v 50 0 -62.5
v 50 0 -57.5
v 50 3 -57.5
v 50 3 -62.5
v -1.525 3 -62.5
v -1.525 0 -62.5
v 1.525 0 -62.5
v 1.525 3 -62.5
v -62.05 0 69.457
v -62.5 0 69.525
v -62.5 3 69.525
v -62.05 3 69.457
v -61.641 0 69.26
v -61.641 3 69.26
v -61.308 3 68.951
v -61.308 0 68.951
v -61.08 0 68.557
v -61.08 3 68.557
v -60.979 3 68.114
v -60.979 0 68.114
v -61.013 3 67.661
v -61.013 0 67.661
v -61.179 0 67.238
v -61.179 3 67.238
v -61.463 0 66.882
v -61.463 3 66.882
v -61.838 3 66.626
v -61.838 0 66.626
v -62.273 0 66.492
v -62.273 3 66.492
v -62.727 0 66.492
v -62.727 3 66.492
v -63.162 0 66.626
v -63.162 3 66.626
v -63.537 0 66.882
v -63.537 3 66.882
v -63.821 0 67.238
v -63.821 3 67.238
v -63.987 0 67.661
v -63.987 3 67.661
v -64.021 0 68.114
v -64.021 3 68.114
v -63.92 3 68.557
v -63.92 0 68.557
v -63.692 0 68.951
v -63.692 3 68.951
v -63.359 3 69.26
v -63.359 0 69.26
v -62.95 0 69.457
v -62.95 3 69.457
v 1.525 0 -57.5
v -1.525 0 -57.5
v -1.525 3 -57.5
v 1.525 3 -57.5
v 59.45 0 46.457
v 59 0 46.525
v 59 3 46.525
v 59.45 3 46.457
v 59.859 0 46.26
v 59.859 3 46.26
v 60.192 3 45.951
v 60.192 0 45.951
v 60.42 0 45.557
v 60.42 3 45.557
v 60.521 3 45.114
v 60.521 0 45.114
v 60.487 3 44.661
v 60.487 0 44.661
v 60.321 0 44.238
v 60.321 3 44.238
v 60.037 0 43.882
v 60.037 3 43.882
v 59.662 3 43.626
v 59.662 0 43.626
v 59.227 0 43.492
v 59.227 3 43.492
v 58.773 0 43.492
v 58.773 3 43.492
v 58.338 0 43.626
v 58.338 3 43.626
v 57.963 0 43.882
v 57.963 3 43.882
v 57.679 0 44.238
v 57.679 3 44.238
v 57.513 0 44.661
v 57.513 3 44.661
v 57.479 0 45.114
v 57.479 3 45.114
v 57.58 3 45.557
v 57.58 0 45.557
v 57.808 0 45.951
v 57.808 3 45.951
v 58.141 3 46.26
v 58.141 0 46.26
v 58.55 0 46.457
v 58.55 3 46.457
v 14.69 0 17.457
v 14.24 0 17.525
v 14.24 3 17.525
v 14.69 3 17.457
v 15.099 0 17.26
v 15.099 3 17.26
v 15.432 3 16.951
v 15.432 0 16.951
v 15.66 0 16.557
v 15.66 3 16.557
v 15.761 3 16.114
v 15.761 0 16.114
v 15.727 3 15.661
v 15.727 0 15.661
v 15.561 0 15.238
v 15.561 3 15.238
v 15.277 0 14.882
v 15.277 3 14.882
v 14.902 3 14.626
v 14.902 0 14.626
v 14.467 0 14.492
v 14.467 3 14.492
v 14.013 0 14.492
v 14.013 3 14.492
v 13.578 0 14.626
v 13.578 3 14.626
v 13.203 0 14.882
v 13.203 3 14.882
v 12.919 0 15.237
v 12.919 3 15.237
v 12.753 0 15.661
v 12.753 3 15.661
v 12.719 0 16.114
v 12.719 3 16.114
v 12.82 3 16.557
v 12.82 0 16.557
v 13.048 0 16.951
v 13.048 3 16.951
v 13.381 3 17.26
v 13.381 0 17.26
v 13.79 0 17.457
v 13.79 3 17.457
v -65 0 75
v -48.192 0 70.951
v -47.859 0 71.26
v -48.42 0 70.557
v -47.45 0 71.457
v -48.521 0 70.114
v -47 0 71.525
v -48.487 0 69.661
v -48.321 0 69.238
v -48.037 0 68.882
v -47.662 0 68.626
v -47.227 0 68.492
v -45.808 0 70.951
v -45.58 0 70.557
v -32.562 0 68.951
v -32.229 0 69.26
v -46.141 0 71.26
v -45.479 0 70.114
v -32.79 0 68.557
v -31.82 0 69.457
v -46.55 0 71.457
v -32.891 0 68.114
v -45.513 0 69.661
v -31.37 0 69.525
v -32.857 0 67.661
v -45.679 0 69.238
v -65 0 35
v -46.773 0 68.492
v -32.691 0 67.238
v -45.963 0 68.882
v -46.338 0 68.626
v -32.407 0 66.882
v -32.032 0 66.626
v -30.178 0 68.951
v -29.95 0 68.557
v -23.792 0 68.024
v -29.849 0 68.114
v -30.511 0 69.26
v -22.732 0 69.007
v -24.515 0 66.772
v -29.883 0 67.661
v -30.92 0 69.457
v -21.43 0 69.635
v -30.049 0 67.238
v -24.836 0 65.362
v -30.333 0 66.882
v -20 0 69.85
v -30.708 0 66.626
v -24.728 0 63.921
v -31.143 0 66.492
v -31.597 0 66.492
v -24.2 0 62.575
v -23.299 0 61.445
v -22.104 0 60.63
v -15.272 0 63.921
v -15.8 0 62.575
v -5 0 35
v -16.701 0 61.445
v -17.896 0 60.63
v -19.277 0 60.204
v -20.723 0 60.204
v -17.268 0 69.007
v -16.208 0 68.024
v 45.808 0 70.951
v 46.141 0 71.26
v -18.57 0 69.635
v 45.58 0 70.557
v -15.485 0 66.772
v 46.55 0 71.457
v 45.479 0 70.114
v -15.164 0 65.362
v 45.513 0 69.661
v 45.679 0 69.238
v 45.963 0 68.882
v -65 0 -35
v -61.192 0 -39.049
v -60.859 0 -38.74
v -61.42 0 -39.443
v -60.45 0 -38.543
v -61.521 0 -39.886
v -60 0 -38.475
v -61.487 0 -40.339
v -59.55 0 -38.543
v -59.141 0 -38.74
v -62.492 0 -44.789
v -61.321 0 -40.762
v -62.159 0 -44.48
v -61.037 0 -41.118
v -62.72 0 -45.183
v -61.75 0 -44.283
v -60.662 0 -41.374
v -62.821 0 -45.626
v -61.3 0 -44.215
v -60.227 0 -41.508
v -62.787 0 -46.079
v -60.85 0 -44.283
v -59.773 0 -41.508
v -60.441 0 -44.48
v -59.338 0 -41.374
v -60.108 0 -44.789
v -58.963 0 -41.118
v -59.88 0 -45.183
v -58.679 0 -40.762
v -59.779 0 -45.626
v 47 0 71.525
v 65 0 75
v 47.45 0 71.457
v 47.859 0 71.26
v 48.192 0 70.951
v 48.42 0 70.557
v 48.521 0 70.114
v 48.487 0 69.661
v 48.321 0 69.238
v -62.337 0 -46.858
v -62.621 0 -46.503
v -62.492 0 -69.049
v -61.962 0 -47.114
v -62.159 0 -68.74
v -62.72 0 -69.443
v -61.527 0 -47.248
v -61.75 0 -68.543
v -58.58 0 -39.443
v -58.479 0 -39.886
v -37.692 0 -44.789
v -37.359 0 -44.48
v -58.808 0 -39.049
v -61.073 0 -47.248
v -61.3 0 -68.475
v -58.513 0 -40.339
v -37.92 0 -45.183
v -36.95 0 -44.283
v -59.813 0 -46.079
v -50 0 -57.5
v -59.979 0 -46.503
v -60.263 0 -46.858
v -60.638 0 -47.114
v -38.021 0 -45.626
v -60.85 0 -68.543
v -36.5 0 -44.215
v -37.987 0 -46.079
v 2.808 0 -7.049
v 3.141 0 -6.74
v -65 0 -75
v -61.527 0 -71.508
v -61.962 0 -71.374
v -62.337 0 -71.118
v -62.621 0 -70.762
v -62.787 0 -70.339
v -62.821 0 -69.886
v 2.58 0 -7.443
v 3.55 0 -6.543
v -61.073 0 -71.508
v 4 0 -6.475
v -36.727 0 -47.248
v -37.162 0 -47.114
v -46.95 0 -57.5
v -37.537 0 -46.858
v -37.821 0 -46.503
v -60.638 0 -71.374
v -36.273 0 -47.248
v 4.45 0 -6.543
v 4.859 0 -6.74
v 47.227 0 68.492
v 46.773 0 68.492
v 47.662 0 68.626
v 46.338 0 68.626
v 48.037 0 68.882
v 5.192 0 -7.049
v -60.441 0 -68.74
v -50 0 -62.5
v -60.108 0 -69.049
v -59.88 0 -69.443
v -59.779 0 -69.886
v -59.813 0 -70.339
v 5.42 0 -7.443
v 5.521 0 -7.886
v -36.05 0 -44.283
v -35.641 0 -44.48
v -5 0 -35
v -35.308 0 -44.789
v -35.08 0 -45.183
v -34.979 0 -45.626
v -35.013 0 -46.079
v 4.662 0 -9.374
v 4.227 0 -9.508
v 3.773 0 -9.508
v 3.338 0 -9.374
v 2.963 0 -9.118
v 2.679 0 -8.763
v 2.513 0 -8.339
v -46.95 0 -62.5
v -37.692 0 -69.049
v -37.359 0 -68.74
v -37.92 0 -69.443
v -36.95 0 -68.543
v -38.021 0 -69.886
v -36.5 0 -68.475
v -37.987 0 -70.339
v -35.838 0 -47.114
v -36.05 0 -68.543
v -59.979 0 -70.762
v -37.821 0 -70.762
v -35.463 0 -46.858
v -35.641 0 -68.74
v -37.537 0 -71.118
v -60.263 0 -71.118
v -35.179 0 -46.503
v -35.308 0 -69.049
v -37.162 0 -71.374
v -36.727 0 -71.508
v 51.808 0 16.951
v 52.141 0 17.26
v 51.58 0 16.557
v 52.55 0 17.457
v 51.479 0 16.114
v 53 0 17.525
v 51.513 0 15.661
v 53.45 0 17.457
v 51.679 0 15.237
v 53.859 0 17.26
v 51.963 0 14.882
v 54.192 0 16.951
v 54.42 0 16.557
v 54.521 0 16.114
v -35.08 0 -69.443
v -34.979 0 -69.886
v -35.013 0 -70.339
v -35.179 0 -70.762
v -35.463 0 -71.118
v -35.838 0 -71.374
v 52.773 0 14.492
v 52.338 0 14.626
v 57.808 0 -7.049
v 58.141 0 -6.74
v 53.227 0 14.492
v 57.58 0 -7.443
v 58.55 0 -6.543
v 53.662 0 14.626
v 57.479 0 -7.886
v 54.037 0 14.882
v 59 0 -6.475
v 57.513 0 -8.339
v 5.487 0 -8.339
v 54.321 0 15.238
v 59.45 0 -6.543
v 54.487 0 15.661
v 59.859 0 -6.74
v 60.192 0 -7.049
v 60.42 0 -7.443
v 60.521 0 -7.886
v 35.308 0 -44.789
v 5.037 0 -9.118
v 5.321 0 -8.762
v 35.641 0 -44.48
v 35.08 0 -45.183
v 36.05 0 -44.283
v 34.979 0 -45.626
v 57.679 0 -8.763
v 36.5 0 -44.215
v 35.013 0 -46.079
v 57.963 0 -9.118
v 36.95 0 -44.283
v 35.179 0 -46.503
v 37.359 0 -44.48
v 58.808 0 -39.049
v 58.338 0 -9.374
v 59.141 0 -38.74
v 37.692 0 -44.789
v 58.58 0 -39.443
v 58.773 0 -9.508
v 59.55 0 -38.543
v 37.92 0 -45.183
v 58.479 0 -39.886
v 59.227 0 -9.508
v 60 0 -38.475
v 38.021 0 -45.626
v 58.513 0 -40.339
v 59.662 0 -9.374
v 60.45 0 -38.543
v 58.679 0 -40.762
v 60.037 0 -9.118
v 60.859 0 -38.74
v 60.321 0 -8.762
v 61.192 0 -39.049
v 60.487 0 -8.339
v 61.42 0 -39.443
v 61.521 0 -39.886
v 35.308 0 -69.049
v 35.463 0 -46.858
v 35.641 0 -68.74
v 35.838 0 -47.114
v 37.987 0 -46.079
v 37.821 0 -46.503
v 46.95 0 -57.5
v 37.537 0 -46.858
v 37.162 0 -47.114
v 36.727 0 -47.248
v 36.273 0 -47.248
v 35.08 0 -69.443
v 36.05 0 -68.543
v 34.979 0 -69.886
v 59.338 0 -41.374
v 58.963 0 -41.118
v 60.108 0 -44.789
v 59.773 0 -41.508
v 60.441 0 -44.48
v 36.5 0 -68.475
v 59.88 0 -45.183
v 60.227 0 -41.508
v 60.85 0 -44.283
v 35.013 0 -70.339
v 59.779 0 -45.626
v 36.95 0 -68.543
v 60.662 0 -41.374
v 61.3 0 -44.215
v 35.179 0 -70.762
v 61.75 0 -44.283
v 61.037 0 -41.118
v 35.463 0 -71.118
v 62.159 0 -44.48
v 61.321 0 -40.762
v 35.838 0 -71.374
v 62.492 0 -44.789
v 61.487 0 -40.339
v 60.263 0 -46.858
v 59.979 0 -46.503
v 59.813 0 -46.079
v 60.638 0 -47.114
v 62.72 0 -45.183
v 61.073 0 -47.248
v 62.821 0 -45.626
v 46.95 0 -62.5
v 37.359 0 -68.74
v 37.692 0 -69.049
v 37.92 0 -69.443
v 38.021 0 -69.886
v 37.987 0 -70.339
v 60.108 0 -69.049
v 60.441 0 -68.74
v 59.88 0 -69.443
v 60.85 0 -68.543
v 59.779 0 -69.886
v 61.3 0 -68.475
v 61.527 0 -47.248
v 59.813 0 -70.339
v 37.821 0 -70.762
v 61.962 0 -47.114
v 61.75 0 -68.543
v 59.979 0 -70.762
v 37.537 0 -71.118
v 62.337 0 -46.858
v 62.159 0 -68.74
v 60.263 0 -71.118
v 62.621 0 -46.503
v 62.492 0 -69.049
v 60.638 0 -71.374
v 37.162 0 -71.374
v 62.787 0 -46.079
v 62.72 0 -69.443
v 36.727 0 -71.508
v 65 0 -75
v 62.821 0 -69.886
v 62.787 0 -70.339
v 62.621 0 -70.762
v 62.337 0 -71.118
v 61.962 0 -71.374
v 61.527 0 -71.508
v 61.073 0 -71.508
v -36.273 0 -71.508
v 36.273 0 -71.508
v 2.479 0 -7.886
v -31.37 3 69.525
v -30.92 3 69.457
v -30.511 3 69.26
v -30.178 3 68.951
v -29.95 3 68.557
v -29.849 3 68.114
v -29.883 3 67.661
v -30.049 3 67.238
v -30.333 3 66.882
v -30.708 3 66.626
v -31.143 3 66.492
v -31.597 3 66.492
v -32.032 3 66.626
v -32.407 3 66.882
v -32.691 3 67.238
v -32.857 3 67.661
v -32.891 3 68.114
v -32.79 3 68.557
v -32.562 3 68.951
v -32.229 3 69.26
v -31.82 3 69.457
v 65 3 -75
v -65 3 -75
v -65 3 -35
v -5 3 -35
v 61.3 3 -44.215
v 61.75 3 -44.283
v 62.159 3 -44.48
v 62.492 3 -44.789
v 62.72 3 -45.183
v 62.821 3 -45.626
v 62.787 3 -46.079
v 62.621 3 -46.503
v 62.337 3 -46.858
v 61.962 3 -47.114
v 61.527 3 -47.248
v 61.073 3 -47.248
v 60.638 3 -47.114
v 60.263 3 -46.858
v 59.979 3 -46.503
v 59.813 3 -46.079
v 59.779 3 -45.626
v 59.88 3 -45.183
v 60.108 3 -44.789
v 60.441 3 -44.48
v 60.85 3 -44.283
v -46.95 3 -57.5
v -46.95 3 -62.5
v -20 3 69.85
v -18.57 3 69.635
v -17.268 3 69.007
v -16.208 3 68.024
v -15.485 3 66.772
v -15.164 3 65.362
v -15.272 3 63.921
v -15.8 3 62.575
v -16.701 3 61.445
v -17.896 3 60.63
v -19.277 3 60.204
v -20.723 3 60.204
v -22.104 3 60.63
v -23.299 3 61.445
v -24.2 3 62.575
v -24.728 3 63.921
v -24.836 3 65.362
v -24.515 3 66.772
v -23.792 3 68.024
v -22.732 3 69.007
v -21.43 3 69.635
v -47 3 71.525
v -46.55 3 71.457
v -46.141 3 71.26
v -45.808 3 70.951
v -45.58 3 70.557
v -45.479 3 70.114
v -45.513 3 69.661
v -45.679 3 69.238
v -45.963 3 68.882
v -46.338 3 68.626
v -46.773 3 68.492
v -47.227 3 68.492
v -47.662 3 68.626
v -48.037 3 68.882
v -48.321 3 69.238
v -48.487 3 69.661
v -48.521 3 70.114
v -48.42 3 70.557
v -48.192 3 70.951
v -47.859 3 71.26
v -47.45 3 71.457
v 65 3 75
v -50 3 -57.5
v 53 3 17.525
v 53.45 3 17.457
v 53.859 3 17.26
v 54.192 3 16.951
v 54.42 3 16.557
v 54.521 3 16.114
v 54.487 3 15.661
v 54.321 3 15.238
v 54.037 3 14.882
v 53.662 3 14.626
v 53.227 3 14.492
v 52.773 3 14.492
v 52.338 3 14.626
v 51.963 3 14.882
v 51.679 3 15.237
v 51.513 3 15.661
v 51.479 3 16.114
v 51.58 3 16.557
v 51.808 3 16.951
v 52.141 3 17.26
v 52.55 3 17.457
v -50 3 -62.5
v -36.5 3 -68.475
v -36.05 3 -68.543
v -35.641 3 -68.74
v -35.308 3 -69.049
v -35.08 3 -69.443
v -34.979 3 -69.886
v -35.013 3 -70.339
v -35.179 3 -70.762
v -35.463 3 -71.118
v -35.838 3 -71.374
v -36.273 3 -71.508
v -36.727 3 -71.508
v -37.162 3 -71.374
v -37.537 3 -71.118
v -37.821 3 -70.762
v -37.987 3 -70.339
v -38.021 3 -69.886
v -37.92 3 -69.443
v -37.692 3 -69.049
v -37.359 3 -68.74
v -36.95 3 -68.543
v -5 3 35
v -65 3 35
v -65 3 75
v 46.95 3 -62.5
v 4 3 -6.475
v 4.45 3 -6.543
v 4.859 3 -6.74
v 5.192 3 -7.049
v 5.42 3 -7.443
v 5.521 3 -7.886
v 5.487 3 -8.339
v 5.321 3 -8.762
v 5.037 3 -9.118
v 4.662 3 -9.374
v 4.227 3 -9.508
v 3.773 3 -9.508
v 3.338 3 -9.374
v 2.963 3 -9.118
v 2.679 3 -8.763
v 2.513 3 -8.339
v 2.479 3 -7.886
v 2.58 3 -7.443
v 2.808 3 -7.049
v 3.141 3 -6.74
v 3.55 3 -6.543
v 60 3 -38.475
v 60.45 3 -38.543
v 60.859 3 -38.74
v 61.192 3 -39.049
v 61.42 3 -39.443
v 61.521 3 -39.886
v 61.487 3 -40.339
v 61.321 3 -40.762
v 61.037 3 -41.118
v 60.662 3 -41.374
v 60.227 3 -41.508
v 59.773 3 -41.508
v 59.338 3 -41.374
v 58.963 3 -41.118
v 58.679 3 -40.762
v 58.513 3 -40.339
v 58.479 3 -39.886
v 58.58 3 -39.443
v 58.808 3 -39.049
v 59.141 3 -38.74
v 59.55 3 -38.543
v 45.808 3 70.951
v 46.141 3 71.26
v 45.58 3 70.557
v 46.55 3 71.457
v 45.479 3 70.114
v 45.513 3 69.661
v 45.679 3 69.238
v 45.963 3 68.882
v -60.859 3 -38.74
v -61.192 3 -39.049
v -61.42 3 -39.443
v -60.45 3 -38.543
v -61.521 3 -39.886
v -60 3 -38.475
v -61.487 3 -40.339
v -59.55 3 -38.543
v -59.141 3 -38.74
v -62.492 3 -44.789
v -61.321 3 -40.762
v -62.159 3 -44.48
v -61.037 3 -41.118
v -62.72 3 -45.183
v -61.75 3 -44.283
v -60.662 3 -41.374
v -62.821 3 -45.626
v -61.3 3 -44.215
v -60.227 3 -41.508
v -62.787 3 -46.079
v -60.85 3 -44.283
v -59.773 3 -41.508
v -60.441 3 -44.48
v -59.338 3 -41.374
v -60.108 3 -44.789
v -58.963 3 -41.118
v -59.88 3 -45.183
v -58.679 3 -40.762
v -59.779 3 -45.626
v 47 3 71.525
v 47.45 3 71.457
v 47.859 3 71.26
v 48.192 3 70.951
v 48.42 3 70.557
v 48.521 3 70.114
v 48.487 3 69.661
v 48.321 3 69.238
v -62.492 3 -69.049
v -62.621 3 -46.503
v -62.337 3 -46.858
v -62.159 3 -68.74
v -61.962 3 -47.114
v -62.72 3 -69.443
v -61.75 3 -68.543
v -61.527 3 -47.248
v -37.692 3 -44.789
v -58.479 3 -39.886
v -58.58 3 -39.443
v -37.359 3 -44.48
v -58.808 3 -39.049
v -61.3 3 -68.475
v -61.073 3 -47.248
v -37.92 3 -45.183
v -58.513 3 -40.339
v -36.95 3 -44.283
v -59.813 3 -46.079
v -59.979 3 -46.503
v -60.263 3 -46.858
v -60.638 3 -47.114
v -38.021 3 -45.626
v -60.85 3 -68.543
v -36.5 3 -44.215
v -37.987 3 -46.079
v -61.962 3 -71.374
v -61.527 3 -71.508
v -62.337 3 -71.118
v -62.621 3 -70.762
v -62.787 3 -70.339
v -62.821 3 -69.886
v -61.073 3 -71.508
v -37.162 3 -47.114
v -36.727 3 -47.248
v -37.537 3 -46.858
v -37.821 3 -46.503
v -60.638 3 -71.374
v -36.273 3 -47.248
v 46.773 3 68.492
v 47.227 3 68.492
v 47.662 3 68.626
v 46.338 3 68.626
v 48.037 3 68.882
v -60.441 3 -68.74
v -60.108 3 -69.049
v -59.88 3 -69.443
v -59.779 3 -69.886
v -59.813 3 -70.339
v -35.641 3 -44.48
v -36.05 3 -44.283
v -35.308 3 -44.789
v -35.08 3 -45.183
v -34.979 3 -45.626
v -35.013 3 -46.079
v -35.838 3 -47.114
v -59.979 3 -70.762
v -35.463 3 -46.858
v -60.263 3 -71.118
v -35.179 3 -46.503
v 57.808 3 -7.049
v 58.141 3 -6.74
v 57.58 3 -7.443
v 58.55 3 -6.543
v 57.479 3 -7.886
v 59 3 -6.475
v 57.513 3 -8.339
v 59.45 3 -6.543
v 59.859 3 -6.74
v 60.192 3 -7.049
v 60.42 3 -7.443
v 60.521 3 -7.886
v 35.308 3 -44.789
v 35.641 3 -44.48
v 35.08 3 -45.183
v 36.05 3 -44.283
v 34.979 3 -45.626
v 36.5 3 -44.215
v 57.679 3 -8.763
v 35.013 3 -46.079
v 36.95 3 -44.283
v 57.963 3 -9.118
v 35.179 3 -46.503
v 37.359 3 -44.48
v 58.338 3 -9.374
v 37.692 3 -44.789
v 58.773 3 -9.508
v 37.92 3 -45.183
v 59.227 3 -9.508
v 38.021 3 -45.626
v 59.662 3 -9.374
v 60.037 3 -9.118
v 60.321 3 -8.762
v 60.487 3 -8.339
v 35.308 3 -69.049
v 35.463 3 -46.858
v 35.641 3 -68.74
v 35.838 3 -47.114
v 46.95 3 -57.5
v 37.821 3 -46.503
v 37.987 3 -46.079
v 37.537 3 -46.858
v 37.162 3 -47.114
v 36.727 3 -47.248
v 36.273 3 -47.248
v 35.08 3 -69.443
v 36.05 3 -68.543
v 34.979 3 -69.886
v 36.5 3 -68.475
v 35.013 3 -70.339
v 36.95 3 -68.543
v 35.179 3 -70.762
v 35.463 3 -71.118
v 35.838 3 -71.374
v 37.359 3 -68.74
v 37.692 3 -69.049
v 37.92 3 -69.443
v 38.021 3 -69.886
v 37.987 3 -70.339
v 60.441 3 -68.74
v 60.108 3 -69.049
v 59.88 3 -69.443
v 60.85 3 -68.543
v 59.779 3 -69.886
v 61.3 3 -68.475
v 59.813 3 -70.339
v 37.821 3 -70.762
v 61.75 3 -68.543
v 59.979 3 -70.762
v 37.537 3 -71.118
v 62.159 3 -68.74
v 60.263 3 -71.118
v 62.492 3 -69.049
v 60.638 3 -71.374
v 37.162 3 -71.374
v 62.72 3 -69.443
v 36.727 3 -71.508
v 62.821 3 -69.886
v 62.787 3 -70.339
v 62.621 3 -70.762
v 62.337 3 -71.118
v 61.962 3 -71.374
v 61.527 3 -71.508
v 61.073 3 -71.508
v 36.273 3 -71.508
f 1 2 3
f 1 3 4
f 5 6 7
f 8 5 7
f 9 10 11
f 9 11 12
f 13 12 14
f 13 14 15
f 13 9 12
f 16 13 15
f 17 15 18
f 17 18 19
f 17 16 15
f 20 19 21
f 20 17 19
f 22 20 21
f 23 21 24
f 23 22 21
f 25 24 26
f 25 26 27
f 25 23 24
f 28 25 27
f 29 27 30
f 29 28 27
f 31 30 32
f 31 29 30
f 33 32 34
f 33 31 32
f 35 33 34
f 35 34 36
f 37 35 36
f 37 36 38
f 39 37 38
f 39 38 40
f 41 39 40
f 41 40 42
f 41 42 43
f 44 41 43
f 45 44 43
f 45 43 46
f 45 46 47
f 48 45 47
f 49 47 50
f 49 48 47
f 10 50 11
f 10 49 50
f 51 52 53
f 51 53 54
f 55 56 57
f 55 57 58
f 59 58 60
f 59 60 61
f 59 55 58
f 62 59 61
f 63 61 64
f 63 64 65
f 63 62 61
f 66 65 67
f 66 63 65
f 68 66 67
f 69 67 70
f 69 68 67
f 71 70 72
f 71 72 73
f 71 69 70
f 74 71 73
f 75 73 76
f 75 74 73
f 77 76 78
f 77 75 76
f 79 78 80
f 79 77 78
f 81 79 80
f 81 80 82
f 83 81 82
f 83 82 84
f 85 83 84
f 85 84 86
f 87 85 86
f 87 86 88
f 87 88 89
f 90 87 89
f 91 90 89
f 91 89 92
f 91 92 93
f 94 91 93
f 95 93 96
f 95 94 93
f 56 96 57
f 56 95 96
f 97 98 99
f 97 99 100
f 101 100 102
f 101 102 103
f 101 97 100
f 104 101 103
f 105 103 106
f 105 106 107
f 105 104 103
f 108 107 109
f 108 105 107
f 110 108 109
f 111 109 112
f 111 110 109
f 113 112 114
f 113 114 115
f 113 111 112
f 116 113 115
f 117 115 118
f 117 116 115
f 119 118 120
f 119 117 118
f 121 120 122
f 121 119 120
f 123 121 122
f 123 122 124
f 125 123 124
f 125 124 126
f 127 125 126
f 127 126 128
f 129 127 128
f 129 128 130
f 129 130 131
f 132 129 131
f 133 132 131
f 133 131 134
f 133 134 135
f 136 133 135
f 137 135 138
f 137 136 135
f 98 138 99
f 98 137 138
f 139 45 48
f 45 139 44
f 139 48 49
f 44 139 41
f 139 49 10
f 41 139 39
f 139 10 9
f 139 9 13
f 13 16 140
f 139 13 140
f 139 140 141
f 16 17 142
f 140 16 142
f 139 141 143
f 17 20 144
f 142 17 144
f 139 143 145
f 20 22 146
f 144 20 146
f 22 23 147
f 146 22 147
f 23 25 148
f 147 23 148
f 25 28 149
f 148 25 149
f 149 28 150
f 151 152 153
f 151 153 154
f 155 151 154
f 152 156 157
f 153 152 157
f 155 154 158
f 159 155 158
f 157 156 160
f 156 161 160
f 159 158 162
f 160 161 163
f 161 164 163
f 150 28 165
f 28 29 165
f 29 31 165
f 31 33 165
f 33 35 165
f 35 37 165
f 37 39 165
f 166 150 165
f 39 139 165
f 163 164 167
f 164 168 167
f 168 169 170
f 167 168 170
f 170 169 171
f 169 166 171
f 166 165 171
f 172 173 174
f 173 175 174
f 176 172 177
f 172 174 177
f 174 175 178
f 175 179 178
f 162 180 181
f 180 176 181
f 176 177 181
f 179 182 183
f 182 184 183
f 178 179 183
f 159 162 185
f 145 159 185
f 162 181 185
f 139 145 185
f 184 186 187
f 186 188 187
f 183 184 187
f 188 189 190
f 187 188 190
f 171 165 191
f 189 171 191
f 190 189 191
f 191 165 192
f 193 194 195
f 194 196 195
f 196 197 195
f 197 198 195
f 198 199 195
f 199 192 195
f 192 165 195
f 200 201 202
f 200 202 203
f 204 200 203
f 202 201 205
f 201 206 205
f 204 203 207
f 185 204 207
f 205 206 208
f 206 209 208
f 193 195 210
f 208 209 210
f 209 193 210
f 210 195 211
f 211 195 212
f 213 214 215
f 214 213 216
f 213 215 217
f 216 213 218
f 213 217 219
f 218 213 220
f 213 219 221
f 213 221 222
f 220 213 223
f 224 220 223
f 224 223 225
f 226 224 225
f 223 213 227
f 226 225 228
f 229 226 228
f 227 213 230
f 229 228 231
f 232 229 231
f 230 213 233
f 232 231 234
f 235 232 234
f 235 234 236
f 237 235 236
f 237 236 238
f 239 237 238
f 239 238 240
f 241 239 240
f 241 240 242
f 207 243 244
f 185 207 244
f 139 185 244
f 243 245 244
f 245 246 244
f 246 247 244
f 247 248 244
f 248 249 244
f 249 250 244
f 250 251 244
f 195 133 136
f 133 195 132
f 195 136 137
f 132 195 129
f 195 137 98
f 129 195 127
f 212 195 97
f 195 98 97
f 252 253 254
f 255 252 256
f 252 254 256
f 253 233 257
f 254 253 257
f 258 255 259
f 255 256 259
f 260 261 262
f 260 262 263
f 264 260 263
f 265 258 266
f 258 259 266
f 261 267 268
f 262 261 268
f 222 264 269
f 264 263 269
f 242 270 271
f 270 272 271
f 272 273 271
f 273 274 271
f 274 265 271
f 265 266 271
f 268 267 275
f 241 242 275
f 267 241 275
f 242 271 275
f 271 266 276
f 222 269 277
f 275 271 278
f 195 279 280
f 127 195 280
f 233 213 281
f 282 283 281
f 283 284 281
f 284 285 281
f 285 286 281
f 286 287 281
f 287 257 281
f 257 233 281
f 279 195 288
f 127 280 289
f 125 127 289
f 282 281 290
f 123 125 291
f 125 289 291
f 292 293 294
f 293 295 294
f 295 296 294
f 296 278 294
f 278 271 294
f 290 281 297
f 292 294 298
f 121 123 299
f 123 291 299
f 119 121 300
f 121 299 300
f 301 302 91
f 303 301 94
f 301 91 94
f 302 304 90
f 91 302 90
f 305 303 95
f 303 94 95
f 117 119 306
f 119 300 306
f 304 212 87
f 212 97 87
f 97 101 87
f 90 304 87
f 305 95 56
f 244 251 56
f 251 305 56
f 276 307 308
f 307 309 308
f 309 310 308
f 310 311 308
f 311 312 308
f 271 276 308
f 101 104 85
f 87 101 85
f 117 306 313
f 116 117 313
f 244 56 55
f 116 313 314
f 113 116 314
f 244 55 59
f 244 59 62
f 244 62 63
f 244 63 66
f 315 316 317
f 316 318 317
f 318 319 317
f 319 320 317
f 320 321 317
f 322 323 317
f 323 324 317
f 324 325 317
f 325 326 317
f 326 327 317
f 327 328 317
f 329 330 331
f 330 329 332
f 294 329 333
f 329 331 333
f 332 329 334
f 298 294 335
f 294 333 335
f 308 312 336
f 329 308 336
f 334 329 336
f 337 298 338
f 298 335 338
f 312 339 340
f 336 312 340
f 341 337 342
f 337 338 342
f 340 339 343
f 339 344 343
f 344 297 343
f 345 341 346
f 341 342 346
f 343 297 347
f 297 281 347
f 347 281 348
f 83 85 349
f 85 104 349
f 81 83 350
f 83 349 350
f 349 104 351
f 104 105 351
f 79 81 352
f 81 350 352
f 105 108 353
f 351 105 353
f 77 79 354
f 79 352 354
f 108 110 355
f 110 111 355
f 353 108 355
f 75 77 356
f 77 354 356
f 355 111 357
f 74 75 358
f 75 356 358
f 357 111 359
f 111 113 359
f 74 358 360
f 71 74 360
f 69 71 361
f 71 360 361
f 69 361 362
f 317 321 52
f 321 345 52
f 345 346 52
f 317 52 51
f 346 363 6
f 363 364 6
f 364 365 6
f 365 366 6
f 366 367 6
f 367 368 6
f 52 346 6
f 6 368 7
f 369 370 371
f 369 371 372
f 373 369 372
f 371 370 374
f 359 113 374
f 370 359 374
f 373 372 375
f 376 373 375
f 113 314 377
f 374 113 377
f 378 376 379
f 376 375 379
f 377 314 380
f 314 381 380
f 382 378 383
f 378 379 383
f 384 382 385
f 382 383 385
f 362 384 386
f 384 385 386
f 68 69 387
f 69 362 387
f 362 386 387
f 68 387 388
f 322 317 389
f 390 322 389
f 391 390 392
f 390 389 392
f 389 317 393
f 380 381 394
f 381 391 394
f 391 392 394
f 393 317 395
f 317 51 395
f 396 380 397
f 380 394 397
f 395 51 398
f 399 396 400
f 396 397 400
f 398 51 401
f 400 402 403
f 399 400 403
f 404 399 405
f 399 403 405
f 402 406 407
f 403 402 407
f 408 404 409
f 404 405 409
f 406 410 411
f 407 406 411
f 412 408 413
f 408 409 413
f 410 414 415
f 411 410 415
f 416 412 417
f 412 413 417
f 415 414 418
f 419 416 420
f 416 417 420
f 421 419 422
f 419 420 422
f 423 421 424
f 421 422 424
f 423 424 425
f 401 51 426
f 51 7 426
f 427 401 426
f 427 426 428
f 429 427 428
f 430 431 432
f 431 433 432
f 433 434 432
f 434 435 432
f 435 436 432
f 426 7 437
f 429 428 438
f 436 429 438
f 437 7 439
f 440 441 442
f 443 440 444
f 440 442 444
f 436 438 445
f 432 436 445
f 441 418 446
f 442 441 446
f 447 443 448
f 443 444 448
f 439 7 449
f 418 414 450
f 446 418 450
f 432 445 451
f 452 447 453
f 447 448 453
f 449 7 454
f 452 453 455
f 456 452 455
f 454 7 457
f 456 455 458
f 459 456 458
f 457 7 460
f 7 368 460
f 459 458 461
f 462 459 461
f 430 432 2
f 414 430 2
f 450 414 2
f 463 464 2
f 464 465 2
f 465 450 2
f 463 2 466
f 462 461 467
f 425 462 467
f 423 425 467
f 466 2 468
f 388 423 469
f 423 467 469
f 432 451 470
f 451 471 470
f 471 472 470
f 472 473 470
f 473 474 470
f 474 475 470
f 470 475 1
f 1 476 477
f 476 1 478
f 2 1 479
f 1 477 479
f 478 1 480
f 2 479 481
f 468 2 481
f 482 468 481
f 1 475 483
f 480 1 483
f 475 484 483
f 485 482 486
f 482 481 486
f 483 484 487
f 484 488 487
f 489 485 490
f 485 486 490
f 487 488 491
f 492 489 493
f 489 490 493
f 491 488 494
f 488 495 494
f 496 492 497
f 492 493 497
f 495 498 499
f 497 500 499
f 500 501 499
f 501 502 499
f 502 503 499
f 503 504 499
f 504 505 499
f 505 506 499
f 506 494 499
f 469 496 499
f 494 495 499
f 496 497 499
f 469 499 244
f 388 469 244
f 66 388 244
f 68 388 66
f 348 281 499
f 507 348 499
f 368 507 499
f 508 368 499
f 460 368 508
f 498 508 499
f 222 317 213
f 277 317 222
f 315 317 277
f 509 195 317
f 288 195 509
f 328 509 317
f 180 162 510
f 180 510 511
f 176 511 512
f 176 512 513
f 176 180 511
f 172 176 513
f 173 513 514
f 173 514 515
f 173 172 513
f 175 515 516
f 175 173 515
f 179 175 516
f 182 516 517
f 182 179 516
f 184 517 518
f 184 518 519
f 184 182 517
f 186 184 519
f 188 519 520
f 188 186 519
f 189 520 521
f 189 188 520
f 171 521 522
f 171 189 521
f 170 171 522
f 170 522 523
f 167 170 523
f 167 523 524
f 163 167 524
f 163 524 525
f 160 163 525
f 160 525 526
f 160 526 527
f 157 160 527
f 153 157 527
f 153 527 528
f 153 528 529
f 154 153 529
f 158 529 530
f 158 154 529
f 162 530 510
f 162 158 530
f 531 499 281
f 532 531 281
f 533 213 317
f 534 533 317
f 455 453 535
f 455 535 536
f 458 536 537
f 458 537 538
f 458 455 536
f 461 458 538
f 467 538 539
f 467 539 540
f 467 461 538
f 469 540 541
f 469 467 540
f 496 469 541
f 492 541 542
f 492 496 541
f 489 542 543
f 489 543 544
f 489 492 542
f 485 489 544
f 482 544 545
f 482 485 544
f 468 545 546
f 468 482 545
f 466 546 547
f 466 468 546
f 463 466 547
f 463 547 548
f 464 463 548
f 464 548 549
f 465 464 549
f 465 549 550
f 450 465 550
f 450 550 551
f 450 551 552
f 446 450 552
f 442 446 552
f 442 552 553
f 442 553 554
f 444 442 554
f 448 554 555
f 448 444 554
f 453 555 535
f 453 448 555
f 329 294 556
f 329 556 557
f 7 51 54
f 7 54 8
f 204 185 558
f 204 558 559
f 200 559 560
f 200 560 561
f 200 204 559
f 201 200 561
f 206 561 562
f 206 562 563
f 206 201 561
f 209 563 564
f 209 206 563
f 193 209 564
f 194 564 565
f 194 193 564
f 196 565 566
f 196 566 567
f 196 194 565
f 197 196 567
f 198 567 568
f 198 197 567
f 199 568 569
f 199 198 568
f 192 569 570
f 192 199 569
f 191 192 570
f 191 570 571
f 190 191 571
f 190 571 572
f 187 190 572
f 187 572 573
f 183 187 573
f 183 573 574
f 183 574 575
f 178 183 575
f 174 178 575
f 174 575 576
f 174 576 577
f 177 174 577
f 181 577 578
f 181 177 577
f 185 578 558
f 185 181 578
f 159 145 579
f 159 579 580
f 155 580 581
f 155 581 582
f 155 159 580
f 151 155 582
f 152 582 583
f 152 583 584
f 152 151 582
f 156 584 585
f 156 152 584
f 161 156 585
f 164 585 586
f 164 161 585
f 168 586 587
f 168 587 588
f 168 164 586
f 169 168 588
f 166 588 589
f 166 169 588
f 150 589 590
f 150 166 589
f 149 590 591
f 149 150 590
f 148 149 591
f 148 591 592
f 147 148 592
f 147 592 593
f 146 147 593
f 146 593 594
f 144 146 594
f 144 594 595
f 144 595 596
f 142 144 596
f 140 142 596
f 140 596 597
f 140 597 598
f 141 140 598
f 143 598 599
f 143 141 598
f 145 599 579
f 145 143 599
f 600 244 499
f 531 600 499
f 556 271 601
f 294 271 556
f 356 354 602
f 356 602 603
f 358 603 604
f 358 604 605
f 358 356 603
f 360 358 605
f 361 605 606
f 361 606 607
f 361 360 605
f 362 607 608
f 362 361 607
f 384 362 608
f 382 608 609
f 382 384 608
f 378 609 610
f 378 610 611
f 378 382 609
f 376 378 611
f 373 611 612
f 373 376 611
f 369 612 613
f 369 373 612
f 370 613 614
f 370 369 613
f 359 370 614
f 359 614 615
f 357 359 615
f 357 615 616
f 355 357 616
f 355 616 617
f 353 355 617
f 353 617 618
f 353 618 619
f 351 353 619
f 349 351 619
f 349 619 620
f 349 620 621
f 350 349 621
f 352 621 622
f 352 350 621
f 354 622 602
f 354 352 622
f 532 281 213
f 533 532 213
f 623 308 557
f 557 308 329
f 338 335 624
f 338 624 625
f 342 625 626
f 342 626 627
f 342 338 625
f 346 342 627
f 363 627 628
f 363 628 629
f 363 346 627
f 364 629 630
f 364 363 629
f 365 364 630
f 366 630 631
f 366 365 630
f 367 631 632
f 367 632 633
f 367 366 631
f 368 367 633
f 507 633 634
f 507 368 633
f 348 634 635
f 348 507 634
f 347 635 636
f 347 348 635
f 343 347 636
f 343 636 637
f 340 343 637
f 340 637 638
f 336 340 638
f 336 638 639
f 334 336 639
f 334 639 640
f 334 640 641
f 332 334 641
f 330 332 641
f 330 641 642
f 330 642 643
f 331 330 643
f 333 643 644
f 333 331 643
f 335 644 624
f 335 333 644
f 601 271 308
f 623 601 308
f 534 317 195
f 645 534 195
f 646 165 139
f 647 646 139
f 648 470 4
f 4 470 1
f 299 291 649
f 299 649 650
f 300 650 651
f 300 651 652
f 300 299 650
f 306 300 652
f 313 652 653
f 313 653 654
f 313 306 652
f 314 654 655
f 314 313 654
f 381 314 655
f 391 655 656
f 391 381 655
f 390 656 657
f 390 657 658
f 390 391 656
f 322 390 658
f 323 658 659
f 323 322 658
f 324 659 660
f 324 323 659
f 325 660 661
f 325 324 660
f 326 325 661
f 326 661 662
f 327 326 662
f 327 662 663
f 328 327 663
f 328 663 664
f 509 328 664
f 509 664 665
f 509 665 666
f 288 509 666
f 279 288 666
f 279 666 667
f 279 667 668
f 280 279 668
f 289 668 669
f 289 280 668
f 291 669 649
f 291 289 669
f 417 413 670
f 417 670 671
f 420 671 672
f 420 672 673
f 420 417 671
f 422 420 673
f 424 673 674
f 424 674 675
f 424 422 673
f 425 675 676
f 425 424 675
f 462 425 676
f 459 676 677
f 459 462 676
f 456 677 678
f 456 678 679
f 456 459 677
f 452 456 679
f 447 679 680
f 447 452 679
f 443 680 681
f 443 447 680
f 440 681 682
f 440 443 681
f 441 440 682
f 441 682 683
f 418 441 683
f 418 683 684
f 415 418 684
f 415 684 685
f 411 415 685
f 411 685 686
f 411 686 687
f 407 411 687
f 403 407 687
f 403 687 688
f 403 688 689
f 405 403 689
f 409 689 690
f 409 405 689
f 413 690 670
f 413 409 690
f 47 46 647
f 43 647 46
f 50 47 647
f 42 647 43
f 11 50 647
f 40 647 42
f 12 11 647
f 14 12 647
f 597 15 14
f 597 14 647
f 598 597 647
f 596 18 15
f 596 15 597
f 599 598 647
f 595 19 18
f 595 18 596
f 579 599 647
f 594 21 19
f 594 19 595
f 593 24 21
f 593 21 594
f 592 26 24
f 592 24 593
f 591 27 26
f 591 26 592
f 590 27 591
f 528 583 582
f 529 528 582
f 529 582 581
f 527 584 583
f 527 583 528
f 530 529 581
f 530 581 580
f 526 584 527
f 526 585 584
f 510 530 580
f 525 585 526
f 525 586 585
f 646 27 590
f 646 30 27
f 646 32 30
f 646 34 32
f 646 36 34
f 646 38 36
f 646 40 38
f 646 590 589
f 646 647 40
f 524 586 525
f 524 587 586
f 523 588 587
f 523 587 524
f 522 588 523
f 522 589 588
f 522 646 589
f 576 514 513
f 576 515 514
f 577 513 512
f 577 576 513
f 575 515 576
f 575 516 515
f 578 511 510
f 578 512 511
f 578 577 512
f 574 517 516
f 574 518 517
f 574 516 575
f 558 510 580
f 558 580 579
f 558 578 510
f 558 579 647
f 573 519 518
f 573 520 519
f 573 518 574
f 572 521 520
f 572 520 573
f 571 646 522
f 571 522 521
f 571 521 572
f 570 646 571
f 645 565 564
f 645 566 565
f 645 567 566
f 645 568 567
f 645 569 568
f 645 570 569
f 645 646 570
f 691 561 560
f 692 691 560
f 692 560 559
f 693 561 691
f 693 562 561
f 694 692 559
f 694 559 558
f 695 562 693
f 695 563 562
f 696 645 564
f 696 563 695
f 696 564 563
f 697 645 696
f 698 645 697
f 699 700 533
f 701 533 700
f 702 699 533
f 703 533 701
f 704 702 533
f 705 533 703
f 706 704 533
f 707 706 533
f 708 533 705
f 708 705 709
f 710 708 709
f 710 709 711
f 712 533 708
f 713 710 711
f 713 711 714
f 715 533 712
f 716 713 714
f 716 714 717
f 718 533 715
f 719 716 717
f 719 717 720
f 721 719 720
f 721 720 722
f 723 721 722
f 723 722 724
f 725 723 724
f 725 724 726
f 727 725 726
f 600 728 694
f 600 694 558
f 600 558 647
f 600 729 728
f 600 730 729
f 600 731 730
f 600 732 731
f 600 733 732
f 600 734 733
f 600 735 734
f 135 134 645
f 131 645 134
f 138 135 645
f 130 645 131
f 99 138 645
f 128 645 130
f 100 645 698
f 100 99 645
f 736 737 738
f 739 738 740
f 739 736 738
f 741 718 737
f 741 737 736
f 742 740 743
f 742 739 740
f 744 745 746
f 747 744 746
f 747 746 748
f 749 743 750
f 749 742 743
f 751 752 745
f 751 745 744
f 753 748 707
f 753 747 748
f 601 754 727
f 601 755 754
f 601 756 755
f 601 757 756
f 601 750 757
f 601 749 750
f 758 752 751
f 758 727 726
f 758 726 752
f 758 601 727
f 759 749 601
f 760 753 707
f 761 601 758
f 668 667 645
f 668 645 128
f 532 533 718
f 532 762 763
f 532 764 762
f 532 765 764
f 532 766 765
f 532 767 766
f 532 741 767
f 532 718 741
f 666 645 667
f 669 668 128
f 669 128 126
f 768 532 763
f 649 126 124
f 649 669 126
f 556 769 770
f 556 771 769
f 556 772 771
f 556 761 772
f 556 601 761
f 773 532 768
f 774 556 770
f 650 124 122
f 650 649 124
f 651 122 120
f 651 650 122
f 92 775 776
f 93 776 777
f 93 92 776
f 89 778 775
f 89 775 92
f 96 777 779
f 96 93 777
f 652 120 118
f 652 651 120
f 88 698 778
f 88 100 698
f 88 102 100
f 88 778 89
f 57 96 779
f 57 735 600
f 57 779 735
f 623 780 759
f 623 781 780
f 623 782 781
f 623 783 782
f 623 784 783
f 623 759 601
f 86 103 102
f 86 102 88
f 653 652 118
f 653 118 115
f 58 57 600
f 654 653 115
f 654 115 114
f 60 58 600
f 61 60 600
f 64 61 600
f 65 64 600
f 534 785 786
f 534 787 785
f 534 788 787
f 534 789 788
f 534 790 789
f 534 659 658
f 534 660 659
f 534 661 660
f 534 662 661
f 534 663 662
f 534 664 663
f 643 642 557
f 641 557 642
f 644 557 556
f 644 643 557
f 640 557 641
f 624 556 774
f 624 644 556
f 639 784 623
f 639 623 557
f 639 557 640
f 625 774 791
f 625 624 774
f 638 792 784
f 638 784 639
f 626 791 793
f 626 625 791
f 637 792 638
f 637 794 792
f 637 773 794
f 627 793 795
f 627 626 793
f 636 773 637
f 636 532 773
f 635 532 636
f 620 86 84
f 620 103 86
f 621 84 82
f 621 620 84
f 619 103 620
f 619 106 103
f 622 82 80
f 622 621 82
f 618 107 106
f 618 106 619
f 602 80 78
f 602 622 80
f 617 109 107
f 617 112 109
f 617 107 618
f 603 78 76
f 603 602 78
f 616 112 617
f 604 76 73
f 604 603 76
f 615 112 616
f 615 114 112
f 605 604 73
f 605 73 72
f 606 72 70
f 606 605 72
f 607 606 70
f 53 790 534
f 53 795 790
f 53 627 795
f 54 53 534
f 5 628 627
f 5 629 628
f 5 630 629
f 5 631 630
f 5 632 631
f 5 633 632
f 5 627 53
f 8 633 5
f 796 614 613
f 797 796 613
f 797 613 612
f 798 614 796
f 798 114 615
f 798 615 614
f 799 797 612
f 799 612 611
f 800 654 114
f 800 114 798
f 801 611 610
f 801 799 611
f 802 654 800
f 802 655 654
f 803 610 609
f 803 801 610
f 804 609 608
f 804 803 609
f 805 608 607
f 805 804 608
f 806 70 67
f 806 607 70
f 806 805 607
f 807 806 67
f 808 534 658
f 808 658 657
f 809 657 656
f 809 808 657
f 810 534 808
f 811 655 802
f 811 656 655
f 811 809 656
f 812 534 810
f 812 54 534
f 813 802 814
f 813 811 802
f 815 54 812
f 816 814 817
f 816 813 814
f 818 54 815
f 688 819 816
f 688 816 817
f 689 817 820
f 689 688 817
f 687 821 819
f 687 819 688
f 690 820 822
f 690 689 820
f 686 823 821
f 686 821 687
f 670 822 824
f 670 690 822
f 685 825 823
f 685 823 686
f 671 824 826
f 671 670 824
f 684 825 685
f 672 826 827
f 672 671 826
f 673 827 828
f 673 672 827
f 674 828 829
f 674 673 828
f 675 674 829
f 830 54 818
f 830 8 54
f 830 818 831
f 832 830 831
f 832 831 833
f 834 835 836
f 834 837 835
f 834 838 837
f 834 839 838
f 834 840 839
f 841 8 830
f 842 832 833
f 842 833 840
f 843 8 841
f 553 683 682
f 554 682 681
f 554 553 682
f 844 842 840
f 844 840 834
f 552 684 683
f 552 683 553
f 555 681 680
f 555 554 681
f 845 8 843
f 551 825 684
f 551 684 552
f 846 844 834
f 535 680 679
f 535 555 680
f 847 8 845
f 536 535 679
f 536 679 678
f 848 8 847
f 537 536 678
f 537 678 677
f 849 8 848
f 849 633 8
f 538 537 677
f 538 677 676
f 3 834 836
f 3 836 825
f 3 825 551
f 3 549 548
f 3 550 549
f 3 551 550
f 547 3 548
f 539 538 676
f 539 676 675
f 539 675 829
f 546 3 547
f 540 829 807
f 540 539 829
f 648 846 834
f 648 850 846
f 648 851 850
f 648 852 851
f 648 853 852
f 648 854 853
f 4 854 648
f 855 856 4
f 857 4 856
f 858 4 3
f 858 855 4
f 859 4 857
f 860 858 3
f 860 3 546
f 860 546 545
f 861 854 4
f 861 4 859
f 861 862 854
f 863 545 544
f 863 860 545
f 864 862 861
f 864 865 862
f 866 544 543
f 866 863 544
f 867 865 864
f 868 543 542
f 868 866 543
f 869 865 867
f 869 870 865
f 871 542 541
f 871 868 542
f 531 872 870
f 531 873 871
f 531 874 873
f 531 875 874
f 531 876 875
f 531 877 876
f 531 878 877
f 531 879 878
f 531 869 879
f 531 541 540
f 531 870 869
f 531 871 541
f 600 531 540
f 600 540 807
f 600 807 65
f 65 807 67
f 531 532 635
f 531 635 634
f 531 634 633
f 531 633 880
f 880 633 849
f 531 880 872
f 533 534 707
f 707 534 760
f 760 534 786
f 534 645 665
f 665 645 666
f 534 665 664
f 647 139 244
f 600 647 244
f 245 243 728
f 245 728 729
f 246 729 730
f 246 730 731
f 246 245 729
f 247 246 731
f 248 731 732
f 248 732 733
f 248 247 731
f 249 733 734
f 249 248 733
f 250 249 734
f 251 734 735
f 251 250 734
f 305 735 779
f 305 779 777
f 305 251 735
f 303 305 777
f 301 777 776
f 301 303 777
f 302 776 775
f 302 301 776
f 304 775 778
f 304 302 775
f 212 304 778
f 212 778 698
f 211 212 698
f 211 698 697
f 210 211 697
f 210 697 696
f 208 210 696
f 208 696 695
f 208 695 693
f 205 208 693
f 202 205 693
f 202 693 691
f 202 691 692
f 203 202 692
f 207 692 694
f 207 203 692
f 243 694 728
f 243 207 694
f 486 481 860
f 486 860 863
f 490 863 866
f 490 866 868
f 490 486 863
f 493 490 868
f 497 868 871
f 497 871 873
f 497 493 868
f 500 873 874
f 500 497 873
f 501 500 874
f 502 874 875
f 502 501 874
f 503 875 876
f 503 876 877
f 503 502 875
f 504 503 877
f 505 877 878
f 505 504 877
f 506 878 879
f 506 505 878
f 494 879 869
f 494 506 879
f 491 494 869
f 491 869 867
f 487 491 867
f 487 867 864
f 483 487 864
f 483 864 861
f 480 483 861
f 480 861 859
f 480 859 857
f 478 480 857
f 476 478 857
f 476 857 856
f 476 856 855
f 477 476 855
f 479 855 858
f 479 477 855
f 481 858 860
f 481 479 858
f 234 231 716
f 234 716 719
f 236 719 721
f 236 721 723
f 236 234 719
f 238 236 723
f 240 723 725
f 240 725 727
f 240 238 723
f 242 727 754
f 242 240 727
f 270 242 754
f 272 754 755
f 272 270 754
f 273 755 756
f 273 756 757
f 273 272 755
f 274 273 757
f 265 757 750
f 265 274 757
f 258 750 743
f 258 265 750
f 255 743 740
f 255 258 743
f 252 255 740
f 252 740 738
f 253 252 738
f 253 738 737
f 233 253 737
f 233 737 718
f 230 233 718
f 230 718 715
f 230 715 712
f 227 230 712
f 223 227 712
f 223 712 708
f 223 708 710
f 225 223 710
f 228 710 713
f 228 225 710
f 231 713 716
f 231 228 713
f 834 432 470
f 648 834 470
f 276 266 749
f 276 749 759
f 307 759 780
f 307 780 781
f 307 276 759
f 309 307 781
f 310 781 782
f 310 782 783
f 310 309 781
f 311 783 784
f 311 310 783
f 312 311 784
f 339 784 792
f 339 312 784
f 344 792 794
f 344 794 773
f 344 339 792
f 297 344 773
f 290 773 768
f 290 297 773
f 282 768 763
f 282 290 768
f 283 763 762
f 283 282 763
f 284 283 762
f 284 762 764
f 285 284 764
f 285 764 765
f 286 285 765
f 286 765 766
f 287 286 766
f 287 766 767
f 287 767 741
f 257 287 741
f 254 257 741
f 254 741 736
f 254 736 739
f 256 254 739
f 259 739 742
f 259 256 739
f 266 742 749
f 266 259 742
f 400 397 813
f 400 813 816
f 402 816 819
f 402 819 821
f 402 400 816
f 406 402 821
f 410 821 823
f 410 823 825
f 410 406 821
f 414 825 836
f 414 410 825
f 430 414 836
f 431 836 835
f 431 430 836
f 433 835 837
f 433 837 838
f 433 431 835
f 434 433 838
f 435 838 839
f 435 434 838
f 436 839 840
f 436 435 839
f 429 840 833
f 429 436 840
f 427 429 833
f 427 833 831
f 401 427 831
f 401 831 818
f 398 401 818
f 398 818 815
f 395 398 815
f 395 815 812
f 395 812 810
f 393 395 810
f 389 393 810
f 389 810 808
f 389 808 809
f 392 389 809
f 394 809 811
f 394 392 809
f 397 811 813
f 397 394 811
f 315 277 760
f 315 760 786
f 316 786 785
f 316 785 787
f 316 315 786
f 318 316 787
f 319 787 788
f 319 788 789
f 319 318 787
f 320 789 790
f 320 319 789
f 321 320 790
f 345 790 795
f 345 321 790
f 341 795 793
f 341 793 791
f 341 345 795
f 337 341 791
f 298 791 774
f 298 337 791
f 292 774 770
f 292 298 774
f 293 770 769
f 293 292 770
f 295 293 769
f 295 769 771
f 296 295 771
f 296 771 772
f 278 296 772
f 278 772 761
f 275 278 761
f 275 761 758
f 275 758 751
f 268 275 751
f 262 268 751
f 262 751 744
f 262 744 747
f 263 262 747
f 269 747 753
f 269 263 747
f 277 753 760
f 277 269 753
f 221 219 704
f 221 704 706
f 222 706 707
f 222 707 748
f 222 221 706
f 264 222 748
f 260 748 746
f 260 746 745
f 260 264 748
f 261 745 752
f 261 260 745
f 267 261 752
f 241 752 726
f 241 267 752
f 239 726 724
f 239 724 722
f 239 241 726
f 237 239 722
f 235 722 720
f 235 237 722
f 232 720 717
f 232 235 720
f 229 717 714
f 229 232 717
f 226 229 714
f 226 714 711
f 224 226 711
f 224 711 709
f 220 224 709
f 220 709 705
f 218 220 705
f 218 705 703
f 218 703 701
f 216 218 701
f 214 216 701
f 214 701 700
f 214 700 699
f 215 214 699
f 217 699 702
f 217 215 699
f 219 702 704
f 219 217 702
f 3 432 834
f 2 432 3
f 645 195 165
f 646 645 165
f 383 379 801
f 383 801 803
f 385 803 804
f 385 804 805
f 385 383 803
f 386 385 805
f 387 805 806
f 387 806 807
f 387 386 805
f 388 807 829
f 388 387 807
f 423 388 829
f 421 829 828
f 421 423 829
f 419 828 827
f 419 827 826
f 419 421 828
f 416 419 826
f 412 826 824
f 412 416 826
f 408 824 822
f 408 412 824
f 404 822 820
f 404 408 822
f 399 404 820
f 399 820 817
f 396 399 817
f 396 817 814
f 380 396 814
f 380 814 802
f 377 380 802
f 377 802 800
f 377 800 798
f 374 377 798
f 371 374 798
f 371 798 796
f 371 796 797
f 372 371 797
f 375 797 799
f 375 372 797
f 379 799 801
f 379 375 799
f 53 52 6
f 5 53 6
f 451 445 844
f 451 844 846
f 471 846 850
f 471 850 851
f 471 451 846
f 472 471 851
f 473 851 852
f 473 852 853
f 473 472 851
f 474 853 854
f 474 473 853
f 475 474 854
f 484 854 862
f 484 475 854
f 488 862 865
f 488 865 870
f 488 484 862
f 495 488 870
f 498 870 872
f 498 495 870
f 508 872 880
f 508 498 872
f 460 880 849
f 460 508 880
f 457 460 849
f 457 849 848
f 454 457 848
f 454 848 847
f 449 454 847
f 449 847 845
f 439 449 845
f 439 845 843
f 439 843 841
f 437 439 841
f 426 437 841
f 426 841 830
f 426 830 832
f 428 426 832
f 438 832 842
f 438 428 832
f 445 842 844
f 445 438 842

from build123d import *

# Parameters (mm, degrees)
SKETCH1_R           = 1.525
SKETCH1_R_2         = 4.85
SKETCH1_W           = 3.05
SKETCH1_H           = 5
BOSS_EXTRUDE1_DEPTH = 3


with BuildPart() as part:
    # Sketch1 → Boss-Extrude1 (new body)
    with BuildSketch(Plane(origin=(0, 0, 0), x_dir=(1, 0, 0), z_dir=(0, 1, 0))):
        Polygon((-65, -75), (65, -75), (65, -52.5), (65, -47.5), (65, 75), (-65, 75), (-65, 35), (-5, 35), (-5, -35), (-65, -35), (-65, -47.5), (-65, -52.5), align=None)
        with Locations(Location((-61.3, 70, 0), (0, 0, 270))):
            Circle(SKETCH1_R, mode=Mode.SUBTRACT)
        with Locations(Location((-61.3, 45.74, 0), (0, 0, 270))):
            Circle(SKETCH1_R, mode=Mode.SUBTRACT)
        with Locations(Location((-36.5, 70, 0), (0, 0, 270))):
            Circle(SKETCH1_R, mode=Mode.SUBTRACT)
        with Locations(Location((-36.5, 45.74, 0), (0, 0, 270))):
            Circle(SKETCH1_R, mode=Mode.SUBTRACT)
        with Locations(Location((36.5, 45.74, 0), (0, 0, 270))):
            Circle(SKETCH1_R, mode=Mode.SUBTRACT)
        with Locations(Location((36.5, 70, 0), (0, 0, 270))):
            Circle(SKETCH1_R, mode=Mode.SUBTRACT)
        with Locations(Location((61.3, 45.74, 0), (0, 0, 270))):
            Circle(SKETCH1_R, mode=Mode.SUBTRACT)
        with Locations(Location((61.3, 70, 0), (0, 0, 270))):
            Circle(SKETCH1_R, mode=Mode.SUBTRACT)
        with Locations(Location((-47, -70, 0), (0, 0, 270))):
            Circle(SKETCH1_R, mode=Mode.SUBTRACT)
        with Locations(Location((47, -70, 0), (0, 0, 270))):
            Circle(SKETCH1_R, mode=Mode.SUBTRACT)
        with Locations(Location((-60, 40, 0), (0, 0, 270))):
            Circle(SKETCH1_R, mode=Mode.SUBTRACT)
        with Locations(Location((60, 40, 0), (0, 0, 270))):
            Circle(SKETCH1_R, mode=Mode.SUBTRACT)
        with Locations(Location((59, -45, 0), (0, 0, 270))):
            Circle(SKETCH1_R, mode=Mode.SUBTRACT)
        with Locations(Location((4, 8, 0), (0, 0, 270))):
            Circle(SKETCH1_R, mode=Mode.SUBTRACT)
        with Locations(Location((59, 8, 0), (0, 0, 270))):
            Circle(SKETCH1_R, mode=Mode.SUBTRACT)
        with Locations(Location((53, -16, 0), (0, 0, 270))):
            Circle(SKETCH1_R, mode=Mode.SUBTRACT)
        with Locations(Location((14.24, -16, 0), (0, 0, 270))):
            Circle(SKETCH1_R, mode=Mode.SUBTRACT)
        with Locations(Location((-62.5, -68, 0), (0, 0, 270))):
            Circle(SKETCH1_R, mode=Mode.SUBTRACT)
        with Locations(Location((-31.37, -68, 0), (0, 0, 270))):
            Circle(SKETCH1_R, mode=Mode.SUBTRACT)
        with Locations(Location((-20, -65, 0), (0, 0, 270))):
            Circle(SKETCH1_R_2, mode=Mode.SUBTRACT)
        with Locations((48.475, 60)):
            Rectangle(SKETCH1_W, SKETCH1_H, mode=Mode.SUBTRACT)
        with Locations((-48.475, 60)):
            Rectangle(SKETCH1_W, SKETCH1_H, mode=Mode.SUBTRACT)
        with Locations((0, 60)):
            Rectangle(SKETCH1_W, SKETCH1_H, mode=Mode.SUBTRACT)
    extrude(amount=BOSS_EXTRUDE1_DEPTH)


solid = part.part
